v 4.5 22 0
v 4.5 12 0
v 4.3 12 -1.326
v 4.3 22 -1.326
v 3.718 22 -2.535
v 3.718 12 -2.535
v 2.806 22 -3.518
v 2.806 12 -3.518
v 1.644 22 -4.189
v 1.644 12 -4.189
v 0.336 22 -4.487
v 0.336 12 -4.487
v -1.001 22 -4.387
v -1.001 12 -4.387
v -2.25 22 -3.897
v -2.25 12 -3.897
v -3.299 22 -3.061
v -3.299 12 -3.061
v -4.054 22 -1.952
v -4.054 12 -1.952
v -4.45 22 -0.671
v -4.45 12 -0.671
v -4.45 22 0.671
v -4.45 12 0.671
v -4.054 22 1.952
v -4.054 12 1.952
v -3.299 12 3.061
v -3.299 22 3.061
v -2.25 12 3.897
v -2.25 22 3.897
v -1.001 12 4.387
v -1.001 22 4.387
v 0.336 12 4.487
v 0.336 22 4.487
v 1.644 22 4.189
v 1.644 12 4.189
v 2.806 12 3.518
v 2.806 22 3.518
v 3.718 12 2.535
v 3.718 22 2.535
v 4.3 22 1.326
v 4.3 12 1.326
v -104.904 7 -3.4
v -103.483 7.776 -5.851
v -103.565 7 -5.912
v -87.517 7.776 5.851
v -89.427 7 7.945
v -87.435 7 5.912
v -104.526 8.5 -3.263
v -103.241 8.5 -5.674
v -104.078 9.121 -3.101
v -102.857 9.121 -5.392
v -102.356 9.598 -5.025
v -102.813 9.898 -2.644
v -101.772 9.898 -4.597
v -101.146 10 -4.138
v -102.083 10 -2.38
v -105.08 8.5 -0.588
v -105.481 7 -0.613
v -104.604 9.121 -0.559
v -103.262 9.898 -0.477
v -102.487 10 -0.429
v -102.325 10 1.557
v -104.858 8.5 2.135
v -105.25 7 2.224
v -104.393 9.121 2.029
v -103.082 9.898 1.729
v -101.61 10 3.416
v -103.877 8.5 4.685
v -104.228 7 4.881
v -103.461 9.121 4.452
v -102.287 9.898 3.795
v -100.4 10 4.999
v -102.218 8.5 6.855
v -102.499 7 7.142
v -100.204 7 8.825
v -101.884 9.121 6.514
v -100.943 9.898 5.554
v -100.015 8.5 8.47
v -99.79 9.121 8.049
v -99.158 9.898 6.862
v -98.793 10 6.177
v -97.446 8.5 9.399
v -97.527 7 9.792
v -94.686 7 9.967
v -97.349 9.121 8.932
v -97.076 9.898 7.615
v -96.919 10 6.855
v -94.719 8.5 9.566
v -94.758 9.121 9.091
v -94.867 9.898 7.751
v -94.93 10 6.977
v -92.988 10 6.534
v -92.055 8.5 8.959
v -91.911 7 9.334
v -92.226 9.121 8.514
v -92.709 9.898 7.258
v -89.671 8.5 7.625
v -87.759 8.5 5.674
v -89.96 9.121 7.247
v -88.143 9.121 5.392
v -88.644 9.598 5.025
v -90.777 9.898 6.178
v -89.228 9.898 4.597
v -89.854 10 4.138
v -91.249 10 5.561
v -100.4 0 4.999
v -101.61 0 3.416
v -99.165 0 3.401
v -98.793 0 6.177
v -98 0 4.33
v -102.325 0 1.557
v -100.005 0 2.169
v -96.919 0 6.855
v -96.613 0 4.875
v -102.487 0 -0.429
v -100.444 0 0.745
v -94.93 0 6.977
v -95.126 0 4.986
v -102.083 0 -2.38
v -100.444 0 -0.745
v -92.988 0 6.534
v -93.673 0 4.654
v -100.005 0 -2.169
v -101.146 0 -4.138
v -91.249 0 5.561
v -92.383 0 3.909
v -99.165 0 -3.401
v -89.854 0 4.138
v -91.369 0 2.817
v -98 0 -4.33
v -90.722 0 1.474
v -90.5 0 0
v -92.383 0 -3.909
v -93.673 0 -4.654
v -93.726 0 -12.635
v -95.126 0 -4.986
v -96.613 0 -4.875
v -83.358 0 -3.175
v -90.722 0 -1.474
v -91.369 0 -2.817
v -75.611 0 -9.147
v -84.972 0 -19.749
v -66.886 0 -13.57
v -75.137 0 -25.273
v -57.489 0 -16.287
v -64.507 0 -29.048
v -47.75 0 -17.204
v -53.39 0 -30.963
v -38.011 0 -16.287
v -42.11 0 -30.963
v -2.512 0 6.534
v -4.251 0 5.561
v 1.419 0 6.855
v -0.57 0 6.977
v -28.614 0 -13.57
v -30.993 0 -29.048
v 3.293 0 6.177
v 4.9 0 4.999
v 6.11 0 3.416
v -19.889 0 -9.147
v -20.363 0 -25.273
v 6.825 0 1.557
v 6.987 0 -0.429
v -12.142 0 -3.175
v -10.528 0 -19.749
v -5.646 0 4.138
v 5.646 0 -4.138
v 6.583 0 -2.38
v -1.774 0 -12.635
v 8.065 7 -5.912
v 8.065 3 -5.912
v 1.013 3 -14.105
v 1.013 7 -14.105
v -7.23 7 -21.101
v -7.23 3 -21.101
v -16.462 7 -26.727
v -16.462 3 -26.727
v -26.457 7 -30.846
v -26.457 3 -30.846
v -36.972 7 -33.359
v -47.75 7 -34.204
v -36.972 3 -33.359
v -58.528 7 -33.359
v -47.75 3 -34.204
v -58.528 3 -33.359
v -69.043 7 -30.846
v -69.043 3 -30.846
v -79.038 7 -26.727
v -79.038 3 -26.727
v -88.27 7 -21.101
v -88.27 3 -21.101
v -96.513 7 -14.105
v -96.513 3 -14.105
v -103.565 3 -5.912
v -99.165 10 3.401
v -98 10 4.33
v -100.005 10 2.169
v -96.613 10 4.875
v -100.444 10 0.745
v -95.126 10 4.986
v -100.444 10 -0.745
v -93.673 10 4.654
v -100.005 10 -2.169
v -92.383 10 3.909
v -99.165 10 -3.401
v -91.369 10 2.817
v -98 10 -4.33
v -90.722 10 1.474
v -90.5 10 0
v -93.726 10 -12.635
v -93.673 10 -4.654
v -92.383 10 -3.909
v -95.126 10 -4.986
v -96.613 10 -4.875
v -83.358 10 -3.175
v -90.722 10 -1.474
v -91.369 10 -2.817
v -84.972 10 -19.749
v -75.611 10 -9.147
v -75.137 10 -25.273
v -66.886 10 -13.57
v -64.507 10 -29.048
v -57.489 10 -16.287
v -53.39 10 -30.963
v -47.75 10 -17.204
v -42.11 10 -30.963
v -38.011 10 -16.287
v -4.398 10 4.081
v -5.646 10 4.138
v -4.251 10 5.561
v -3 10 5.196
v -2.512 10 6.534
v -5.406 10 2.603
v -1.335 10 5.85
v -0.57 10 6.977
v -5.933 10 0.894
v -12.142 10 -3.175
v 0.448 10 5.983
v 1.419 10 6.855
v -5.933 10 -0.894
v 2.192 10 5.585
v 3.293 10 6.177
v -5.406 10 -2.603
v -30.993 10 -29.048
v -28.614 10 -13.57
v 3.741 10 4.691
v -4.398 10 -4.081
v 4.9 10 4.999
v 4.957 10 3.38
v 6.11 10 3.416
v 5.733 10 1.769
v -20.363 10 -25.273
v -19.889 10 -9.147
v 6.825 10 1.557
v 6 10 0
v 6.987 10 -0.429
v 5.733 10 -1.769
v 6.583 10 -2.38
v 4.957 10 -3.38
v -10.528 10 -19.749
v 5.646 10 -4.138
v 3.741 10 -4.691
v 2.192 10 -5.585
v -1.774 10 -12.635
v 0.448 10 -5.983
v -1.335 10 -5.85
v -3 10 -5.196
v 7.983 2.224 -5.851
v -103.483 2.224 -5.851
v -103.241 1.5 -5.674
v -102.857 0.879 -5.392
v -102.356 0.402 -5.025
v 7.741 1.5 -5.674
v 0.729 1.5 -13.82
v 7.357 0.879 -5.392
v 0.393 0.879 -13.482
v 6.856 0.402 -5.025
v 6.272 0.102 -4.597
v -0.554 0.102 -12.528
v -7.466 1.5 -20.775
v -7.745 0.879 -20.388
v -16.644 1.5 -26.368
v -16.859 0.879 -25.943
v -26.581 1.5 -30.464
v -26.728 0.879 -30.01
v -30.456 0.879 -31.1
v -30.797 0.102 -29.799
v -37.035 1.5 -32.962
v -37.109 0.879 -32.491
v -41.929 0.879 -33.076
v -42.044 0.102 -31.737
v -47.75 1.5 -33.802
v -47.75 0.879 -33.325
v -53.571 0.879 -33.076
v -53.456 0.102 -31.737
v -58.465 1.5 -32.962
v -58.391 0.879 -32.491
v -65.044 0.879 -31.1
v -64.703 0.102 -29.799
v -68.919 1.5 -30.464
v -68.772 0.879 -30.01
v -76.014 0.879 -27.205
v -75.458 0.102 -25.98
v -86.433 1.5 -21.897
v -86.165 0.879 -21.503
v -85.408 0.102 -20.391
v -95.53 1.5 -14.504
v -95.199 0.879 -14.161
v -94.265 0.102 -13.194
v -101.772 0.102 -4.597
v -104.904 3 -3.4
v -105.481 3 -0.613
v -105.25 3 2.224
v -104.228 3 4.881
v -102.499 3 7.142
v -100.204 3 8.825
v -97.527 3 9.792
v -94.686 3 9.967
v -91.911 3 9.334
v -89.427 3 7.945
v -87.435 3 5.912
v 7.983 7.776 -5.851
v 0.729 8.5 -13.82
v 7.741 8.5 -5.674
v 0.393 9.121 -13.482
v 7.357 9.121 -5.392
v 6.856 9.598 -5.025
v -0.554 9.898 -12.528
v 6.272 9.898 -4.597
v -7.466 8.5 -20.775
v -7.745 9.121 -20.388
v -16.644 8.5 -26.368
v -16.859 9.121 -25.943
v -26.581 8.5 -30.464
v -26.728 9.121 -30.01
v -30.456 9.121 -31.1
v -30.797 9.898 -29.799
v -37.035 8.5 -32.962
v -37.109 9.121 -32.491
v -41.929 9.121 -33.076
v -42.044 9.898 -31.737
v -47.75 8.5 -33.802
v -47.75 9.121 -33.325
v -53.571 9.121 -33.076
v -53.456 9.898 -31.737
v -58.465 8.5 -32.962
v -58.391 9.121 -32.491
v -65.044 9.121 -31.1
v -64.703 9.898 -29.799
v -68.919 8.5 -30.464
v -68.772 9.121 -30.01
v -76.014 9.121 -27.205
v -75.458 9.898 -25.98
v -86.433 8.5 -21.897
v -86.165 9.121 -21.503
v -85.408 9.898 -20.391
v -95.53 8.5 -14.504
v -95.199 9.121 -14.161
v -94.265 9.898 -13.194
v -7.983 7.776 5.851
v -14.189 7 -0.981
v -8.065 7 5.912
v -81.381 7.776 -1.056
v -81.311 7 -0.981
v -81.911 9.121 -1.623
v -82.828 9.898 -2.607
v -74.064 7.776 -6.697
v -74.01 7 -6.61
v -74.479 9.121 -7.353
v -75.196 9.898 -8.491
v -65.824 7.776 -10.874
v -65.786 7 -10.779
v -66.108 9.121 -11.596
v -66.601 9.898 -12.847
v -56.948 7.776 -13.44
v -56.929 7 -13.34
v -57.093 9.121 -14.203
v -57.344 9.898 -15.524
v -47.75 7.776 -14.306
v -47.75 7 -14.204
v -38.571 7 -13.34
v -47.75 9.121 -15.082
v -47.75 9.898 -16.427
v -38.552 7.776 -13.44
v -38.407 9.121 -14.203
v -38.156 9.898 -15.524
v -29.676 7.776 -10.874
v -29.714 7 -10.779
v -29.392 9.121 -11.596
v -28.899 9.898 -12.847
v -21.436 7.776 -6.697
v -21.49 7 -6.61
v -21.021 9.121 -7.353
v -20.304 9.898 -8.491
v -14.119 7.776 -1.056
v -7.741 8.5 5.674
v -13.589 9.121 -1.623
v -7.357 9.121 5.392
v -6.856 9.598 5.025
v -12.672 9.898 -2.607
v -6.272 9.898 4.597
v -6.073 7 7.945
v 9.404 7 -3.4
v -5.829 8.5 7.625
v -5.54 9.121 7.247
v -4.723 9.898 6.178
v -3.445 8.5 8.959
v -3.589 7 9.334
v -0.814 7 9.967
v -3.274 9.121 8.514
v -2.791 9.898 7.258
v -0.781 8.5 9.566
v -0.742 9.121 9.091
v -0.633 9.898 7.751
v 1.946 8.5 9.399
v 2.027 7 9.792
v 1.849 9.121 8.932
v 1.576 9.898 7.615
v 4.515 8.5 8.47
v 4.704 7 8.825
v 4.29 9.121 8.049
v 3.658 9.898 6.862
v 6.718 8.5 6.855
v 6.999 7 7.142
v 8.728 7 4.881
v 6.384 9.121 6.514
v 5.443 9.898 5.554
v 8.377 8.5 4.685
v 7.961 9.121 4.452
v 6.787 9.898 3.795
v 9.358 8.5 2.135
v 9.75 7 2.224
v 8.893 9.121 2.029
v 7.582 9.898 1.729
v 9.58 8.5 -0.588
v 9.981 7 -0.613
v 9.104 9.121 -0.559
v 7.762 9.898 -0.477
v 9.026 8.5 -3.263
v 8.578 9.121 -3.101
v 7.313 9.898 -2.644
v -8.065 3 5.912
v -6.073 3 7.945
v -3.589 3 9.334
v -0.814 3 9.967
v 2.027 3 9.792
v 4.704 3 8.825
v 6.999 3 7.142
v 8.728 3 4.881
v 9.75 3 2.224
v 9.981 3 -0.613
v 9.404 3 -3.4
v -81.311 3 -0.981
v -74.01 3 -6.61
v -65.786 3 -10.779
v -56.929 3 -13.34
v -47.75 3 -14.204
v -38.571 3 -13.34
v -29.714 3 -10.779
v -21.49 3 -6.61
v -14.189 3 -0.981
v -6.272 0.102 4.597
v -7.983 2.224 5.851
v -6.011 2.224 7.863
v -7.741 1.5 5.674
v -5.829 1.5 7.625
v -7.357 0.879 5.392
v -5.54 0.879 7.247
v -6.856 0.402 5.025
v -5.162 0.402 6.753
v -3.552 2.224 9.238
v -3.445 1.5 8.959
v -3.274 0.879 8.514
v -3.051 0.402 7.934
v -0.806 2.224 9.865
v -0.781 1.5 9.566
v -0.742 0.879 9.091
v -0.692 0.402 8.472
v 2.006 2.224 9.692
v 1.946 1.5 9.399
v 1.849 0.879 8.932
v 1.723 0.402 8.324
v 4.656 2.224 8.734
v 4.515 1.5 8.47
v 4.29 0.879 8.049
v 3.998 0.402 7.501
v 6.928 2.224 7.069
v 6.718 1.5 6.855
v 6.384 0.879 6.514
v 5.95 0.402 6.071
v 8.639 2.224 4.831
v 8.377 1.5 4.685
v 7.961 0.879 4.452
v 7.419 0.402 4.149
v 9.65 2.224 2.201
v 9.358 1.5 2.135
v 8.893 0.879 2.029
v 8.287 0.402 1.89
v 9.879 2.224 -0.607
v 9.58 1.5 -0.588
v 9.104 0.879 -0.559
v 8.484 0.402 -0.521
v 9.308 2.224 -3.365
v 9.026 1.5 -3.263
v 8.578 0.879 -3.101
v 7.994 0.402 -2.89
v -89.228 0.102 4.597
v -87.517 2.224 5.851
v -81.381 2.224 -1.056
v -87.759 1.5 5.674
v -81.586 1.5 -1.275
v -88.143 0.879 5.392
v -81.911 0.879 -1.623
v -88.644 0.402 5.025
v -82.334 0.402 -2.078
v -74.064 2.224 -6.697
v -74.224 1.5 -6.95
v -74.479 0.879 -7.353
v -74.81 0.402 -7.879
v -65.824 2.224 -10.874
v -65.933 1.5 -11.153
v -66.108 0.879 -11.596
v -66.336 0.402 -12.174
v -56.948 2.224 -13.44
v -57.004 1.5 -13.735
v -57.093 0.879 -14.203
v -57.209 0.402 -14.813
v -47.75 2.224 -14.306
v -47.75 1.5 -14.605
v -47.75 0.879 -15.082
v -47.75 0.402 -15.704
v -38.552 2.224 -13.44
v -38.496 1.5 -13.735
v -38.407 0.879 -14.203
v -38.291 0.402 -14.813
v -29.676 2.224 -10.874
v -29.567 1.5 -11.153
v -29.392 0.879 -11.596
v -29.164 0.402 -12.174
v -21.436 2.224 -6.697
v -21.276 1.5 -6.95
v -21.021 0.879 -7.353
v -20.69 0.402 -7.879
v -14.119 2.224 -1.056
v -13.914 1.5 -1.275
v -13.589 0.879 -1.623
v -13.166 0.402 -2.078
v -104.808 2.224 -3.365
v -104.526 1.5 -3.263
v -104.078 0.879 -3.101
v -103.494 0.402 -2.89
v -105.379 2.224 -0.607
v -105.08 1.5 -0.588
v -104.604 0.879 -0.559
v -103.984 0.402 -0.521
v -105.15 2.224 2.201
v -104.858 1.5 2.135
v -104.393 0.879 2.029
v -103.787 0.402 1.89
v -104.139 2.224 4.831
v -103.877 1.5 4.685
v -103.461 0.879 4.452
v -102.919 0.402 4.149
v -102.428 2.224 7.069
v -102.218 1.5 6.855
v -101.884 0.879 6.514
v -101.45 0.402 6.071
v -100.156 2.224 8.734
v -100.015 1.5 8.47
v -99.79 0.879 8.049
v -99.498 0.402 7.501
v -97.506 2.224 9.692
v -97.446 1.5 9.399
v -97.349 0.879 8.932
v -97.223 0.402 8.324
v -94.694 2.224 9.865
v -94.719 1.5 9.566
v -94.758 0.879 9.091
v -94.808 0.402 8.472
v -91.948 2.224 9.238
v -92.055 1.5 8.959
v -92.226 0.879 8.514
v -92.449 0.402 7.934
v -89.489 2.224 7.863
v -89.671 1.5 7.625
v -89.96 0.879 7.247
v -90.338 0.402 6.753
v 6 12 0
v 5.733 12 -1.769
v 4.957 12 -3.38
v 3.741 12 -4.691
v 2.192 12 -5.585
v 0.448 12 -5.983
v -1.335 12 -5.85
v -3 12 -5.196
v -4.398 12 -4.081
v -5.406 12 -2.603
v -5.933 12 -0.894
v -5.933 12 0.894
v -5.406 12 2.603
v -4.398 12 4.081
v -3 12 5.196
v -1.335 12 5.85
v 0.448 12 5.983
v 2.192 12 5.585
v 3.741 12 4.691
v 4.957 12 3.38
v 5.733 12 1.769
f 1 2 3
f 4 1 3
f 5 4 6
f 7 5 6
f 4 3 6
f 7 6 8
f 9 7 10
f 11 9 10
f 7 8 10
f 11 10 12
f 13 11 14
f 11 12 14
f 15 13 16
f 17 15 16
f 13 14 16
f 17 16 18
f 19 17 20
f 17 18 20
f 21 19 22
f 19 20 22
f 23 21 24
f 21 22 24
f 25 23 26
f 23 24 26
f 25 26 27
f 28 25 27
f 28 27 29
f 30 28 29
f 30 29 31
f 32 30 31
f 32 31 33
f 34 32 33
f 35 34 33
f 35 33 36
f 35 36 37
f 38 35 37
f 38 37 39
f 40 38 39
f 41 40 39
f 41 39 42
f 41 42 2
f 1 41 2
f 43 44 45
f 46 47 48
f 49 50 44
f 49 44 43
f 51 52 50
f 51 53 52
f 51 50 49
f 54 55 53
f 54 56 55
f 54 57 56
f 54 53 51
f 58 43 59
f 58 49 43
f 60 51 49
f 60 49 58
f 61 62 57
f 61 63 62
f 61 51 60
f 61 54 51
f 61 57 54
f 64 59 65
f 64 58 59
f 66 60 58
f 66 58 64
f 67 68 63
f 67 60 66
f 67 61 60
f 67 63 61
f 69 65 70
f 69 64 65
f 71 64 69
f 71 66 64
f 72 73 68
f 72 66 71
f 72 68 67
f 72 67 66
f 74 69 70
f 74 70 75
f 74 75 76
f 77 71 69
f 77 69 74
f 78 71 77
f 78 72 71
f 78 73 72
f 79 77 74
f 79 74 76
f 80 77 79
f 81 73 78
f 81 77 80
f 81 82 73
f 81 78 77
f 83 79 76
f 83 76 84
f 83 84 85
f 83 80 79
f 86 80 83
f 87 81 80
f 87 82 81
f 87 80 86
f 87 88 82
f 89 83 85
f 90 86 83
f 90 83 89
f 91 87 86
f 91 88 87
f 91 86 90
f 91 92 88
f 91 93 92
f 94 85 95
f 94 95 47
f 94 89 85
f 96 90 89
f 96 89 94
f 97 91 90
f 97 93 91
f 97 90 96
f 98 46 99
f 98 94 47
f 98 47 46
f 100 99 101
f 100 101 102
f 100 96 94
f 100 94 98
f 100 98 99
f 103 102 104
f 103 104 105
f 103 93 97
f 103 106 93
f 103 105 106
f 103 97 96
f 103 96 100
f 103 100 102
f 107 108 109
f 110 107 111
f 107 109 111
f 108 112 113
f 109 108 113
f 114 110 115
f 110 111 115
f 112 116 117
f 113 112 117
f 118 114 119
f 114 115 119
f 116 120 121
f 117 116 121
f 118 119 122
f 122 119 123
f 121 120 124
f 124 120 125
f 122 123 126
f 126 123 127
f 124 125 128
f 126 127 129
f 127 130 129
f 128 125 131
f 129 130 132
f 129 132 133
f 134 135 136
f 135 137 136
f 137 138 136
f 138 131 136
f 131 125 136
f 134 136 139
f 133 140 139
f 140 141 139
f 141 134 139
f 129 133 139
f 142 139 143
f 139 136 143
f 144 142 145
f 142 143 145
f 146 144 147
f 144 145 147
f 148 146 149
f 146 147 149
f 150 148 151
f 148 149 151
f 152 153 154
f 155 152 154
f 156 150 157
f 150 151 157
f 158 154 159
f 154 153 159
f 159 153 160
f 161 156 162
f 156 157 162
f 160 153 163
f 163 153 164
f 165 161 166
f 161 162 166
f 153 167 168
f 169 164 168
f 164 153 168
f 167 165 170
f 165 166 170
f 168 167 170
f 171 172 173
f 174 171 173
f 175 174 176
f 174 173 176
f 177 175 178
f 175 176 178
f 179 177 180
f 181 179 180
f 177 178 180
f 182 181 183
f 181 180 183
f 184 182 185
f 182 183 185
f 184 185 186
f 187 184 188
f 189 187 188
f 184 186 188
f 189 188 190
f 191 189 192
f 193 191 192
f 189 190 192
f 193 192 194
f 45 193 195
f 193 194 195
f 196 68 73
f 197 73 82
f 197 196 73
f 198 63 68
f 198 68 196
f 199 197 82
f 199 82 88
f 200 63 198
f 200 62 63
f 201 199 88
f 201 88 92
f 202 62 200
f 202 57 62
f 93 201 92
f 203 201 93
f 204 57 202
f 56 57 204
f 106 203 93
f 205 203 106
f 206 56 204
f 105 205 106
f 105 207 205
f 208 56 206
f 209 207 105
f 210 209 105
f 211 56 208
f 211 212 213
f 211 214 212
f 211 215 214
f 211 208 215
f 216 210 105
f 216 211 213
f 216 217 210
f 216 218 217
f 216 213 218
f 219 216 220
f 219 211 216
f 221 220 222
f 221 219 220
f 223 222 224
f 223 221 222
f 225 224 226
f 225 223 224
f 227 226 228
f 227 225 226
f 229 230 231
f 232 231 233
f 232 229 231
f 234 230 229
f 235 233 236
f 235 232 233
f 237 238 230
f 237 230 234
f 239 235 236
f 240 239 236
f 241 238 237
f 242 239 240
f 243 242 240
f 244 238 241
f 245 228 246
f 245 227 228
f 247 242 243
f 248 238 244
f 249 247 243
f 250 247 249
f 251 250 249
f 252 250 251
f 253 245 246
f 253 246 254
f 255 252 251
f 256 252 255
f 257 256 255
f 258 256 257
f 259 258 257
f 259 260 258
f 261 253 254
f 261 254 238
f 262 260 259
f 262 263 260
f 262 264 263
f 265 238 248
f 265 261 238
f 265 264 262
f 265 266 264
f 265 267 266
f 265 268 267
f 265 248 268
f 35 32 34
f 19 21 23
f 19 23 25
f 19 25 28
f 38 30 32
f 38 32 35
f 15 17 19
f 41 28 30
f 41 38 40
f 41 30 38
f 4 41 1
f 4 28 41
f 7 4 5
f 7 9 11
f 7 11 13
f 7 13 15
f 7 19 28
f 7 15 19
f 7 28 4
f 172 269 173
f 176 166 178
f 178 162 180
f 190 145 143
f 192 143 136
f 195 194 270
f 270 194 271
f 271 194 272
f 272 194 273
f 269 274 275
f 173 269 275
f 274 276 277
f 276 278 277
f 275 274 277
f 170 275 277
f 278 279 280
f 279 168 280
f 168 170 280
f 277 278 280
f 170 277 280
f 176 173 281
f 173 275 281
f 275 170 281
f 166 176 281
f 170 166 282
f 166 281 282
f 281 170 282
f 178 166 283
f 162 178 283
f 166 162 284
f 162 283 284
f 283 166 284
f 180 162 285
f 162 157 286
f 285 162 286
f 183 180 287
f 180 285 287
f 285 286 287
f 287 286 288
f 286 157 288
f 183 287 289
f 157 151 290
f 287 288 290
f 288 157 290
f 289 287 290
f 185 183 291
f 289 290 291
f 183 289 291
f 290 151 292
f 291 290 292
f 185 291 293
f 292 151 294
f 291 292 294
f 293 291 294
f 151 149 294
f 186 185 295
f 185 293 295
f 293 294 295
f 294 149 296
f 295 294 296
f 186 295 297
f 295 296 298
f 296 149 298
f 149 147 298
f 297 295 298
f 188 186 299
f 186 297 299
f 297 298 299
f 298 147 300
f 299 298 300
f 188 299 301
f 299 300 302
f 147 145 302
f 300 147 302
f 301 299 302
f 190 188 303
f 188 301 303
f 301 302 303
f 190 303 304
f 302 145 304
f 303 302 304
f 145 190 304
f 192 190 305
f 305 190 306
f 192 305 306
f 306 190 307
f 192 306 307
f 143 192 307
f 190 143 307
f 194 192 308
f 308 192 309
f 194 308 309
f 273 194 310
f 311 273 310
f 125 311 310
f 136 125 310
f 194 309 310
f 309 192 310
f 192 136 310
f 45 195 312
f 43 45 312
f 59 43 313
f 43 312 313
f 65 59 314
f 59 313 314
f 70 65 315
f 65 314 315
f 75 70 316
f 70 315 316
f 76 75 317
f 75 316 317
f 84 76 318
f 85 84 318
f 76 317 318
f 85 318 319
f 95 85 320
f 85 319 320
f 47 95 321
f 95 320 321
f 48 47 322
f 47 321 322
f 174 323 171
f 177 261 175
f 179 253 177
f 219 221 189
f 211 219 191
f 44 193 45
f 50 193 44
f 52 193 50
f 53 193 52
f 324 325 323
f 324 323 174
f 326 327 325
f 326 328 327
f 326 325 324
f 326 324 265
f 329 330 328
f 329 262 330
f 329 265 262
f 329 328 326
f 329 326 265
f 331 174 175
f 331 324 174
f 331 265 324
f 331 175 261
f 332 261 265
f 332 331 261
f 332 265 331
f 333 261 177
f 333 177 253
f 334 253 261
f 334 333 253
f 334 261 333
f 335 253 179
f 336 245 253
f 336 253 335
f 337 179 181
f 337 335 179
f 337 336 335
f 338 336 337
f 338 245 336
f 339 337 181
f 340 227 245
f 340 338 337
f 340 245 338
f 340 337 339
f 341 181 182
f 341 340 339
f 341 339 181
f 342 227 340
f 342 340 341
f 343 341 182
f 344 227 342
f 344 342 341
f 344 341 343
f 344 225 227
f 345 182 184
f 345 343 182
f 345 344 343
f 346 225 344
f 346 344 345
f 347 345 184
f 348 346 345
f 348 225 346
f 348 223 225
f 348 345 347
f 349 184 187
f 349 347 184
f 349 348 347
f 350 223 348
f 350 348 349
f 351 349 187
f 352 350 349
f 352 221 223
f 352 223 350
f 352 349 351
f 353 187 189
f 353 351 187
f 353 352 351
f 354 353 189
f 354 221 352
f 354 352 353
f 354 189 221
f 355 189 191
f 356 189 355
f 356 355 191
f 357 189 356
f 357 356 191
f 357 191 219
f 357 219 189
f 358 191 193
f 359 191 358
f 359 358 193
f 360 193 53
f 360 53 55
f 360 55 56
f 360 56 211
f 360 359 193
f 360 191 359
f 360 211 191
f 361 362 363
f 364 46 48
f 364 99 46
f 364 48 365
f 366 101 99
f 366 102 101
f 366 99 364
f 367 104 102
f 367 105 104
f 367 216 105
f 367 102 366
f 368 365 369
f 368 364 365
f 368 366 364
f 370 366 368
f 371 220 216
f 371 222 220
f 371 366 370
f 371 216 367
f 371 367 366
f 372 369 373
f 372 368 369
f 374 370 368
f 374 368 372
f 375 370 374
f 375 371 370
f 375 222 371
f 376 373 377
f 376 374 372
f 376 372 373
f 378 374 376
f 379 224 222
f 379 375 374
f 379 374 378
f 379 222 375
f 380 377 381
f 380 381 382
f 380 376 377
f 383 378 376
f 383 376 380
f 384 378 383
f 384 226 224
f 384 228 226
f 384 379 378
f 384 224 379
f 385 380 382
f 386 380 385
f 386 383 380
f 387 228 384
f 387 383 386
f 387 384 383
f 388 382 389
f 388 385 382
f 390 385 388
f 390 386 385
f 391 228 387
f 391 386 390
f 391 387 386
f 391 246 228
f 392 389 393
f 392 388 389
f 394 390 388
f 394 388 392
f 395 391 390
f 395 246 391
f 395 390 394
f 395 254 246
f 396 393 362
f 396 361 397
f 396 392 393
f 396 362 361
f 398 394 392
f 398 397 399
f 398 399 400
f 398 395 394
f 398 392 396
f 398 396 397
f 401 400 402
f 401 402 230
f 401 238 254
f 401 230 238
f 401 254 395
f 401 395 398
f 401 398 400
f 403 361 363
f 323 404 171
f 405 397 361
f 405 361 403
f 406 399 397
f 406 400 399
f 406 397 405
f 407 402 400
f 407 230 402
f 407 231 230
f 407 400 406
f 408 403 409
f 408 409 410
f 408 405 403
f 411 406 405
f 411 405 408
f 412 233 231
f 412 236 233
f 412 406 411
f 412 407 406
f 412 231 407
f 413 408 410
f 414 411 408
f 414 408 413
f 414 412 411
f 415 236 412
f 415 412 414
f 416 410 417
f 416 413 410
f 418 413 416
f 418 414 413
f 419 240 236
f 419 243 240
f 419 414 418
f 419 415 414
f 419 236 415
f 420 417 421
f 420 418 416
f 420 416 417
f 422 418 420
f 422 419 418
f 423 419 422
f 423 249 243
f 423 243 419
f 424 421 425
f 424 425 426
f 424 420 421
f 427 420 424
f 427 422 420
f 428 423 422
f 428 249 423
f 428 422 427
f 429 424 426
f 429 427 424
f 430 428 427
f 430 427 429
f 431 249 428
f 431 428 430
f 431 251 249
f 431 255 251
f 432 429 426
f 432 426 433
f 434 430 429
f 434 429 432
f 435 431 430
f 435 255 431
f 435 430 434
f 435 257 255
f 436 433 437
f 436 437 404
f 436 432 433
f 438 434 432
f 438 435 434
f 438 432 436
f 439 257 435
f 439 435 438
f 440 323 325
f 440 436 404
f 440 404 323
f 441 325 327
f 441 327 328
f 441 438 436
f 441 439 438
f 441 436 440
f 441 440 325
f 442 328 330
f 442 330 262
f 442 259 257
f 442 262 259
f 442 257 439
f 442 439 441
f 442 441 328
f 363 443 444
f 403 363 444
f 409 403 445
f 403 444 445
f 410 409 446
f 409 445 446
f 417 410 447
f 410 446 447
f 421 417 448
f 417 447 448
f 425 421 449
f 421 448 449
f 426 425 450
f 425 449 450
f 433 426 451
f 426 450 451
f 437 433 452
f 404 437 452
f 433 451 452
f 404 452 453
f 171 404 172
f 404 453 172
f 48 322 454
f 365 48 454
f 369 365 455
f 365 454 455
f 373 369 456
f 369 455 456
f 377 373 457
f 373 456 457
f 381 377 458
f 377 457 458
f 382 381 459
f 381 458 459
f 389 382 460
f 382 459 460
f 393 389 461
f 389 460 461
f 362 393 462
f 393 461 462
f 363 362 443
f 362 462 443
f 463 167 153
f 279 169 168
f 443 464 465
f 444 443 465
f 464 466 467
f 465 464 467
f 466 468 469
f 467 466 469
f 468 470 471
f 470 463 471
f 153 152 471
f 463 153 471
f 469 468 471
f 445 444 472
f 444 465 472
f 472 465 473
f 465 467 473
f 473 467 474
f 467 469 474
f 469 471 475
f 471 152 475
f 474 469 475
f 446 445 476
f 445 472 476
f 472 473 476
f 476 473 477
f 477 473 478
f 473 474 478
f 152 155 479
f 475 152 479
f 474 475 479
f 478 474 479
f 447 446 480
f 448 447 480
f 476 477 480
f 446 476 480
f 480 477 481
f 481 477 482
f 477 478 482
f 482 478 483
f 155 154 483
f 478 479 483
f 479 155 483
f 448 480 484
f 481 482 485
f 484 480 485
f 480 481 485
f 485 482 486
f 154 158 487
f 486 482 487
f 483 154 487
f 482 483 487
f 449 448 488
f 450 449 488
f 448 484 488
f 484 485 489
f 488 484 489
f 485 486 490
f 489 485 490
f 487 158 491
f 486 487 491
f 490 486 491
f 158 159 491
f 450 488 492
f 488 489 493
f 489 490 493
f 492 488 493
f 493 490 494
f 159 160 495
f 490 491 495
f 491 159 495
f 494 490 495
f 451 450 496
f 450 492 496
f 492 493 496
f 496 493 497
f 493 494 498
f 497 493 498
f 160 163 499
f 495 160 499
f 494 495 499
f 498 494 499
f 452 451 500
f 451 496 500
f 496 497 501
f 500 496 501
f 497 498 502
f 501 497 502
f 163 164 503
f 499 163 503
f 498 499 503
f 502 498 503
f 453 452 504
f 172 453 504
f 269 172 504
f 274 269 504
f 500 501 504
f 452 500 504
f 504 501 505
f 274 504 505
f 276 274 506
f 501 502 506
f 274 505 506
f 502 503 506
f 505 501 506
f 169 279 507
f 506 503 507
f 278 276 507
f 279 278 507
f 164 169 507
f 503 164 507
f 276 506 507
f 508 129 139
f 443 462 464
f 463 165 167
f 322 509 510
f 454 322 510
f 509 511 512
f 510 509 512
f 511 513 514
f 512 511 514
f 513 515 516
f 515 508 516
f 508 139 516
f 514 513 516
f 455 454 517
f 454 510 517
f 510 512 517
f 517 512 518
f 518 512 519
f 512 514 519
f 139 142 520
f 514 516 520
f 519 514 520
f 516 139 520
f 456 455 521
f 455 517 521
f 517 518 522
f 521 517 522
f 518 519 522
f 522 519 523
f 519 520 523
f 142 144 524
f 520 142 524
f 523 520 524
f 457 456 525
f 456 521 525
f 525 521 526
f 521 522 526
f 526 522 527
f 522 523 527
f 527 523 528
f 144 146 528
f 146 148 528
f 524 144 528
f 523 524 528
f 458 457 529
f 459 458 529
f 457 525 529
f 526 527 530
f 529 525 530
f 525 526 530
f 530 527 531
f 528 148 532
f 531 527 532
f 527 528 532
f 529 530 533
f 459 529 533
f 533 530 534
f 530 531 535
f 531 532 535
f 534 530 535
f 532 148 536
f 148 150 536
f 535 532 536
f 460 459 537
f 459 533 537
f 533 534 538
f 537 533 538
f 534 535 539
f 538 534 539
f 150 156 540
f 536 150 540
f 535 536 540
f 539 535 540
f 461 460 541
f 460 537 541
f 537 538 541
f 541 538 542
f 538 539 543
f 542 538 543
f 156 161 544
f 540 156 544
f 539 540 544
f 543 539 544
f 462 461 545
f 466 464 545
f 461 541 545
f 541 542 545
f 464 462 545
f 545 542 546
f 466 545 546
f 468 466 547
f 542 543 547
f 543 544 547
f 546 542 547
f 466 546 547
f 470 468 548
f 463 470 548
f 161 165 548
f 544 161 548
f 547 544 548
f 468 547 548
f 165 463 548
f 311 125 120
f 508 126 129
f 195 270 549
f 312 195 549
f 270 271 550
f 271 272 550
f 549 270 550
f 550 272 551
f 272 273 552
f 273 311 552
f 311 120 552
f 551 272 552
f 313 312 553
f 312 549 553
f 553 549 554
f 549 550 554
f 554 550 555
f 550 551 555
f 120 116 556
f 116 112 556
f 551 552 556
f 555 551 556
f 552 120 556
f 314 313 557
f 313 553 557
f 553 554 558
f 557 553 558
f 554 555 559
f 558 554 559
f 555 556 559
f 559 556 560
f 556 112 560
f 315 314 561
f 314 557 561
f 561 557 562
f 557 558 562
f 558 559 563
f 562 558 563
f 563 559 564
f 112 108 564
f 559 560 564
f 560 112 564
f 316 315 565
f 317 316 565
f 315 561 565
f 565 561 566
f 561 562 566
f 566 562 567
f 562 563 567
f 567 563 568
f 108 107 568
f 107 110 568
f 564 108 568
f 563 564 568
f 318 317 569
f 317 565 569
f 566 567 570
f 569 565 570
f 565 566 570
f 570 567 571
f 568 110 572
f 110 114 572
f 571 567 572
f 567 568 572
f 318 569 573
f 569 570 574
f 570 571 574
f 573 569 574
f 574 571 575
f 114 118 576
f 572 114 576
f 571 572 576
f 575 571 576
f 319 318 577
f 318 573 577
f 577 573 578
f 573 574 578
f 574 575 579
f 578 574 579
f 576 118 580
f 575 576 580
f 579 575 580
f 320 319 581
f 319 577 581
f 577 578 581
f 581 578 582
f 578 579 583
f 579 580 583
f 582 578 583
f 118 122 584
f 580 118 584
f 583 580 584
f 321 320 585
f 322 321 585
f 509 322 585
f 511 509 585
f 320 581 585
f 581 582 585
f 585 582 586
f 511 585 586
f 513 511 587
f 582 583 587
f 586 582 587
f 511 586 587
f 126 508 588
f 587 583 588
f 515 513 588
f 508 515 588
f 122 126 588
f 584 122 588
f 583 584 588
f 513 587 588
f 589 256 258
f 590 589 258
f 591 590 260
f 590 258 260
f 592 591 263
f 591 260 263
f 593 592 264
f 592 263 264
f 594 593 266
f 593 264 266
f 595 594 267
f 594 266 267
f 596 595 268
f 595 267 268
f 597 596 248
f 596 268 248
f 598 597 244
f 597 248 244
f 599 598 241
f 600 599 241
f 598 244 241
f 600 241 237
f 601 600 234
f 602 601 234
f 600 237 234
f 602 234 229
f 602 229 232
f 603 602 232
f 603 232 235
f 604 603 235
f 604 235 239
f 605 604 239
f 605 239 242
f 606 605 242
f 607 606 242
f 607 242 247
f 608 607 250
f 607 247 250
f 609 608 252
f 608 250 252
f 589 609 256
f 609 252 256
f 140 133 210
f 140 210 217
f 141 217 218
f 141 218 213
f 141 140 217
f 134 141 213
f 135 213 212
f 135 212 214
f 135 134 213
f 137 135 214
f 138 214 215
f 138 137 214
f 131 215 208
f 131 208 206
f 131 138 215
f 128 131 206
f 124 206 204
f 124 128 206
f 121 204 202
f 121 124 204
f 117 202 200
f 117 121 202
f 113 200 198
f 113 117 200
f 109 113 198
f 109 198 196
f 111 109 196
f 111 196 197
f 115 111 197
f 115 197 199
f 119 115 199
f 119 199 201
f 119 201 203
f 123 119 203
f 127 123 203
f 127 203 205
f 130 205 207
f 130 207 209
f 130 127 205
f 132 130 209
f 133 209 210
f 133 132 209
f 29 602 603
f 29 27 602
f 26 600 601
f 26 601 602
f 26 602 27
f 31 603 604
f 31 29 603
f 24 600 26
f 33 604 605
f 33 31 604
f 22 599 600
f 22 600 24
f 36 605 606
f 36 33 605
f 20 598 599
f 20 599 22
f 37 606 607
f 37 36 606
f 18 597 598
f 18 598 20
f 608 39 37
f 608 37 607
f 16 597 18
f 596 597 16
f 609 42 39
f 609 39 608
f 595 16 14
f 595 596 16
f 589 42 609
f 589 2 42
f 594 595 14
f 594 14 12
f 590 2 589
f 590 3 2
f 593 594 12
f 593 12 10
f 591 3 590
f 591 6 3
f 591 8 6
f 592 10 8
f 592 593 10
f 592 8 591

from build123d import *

# Parameters (mm, degrees)
SKETCH2_R           = 5
BOSS_EXTRUDE1_DEPTH = 10
FILLET1_R           = 3
SKETCH3_R           = 5
BOSS_EXTRUDE2_DEPTH = 10
SKETCH4_R           = 6
SKETCH4_R_2         = 4.5
BOSS_EXTRUDE3_DEPTH = 2
SKETCH6_R           = 4.5
BOSS_EXTRUDE4_DEPTH = 12


with BuildPart() as part:
    # Sketch2 → Boss-Extrude1 (new body)
    with BuildSketch(Plane(origin=(0, 0, 0), x_dir=(1, 0, 0), z_dir=(0, 1, 0))):
        with BuildLine():
            ThreePointArc((-8.065392234, -5.911805826), (5.911805826, -8.065392234), (8.065392234, 5.911805826))
            ThreePointArc((8.065392234, 5.911805826), (-47.75, 34.203568305), (-103.565392234, 5.911805826))
            ThreePointArc((-103.565392234, 5.911805826), (-101.411805826, -8.065392234), (-87.434607766, -5.911805826))
            ThreePointArc((-87.434607766, -5.911805826), (-47.75, 14.203568305), (-8.065392234, -5.911805826))
        make_face()
        with Locations((-95.5, 0)):
            Circle(SKETCH2_R, mode=Mode.SUBTRACT)
        Circle(SKETCH2_R, mode=Mode.SUBTRACT)
    extrude(amount=BOSS_EXTRUDE1_DEPTH)

    # Fillet1
    fillet1_edges = [part.edges().sort_by_distance(p)[0] for p in [
        (5.911805826, 10, 8.065392234),
        (-47.75, 10, -34.203568305),
        (-101.411805826, 10, 8.065392234),
        (-47.75, 10, -14.203568305),
        (-47.75, 0, -14.203568305),
        (-101.411805826, 0, 8.065392234),
        (-47.75, 0, -34.203568305),
        (5.911805826, 0, 8.065392234),
    ]]
    fillet(fillet1_edges, radius=FILLET1_R)

    # Sketch3 → Boss-Extrude2 (add)
    with BuildSketch(Plane(origin=(0, 10, 0), x_dir=(1, 0, 0), z_dir=(0, 1, 0))):
        Circle(SKETCH3_R)
    extrude(amount=-BOSS_EXTRUDE2_DEPTH)

    # Sketch4 → Boss-Extrude3 (add)
    with BuildSketch(Plane(origin=(0, 10, 0), x_dir=(1, 0, 0), z_dir=(0, 1, 0))):
        Circle(SKETCH4_R)
        Circle(SKETCH4_R_2, mode=Mode.SUBTRACT)
    extrude(amount=BOSS_EXTRUDE3_DEPTH)

    # Sketch6 → Boss-Extrude4 (add)
    with BuildSketch(Plane(origin=(0, 10, 0), x_dir=(1, 0, 0), z_dir=(0, 1, 0))):
        Circle(SKETCH6_R)
    extrude(amount=BOSS_EXTRUDE4_DEPTH)


solid = part.part
